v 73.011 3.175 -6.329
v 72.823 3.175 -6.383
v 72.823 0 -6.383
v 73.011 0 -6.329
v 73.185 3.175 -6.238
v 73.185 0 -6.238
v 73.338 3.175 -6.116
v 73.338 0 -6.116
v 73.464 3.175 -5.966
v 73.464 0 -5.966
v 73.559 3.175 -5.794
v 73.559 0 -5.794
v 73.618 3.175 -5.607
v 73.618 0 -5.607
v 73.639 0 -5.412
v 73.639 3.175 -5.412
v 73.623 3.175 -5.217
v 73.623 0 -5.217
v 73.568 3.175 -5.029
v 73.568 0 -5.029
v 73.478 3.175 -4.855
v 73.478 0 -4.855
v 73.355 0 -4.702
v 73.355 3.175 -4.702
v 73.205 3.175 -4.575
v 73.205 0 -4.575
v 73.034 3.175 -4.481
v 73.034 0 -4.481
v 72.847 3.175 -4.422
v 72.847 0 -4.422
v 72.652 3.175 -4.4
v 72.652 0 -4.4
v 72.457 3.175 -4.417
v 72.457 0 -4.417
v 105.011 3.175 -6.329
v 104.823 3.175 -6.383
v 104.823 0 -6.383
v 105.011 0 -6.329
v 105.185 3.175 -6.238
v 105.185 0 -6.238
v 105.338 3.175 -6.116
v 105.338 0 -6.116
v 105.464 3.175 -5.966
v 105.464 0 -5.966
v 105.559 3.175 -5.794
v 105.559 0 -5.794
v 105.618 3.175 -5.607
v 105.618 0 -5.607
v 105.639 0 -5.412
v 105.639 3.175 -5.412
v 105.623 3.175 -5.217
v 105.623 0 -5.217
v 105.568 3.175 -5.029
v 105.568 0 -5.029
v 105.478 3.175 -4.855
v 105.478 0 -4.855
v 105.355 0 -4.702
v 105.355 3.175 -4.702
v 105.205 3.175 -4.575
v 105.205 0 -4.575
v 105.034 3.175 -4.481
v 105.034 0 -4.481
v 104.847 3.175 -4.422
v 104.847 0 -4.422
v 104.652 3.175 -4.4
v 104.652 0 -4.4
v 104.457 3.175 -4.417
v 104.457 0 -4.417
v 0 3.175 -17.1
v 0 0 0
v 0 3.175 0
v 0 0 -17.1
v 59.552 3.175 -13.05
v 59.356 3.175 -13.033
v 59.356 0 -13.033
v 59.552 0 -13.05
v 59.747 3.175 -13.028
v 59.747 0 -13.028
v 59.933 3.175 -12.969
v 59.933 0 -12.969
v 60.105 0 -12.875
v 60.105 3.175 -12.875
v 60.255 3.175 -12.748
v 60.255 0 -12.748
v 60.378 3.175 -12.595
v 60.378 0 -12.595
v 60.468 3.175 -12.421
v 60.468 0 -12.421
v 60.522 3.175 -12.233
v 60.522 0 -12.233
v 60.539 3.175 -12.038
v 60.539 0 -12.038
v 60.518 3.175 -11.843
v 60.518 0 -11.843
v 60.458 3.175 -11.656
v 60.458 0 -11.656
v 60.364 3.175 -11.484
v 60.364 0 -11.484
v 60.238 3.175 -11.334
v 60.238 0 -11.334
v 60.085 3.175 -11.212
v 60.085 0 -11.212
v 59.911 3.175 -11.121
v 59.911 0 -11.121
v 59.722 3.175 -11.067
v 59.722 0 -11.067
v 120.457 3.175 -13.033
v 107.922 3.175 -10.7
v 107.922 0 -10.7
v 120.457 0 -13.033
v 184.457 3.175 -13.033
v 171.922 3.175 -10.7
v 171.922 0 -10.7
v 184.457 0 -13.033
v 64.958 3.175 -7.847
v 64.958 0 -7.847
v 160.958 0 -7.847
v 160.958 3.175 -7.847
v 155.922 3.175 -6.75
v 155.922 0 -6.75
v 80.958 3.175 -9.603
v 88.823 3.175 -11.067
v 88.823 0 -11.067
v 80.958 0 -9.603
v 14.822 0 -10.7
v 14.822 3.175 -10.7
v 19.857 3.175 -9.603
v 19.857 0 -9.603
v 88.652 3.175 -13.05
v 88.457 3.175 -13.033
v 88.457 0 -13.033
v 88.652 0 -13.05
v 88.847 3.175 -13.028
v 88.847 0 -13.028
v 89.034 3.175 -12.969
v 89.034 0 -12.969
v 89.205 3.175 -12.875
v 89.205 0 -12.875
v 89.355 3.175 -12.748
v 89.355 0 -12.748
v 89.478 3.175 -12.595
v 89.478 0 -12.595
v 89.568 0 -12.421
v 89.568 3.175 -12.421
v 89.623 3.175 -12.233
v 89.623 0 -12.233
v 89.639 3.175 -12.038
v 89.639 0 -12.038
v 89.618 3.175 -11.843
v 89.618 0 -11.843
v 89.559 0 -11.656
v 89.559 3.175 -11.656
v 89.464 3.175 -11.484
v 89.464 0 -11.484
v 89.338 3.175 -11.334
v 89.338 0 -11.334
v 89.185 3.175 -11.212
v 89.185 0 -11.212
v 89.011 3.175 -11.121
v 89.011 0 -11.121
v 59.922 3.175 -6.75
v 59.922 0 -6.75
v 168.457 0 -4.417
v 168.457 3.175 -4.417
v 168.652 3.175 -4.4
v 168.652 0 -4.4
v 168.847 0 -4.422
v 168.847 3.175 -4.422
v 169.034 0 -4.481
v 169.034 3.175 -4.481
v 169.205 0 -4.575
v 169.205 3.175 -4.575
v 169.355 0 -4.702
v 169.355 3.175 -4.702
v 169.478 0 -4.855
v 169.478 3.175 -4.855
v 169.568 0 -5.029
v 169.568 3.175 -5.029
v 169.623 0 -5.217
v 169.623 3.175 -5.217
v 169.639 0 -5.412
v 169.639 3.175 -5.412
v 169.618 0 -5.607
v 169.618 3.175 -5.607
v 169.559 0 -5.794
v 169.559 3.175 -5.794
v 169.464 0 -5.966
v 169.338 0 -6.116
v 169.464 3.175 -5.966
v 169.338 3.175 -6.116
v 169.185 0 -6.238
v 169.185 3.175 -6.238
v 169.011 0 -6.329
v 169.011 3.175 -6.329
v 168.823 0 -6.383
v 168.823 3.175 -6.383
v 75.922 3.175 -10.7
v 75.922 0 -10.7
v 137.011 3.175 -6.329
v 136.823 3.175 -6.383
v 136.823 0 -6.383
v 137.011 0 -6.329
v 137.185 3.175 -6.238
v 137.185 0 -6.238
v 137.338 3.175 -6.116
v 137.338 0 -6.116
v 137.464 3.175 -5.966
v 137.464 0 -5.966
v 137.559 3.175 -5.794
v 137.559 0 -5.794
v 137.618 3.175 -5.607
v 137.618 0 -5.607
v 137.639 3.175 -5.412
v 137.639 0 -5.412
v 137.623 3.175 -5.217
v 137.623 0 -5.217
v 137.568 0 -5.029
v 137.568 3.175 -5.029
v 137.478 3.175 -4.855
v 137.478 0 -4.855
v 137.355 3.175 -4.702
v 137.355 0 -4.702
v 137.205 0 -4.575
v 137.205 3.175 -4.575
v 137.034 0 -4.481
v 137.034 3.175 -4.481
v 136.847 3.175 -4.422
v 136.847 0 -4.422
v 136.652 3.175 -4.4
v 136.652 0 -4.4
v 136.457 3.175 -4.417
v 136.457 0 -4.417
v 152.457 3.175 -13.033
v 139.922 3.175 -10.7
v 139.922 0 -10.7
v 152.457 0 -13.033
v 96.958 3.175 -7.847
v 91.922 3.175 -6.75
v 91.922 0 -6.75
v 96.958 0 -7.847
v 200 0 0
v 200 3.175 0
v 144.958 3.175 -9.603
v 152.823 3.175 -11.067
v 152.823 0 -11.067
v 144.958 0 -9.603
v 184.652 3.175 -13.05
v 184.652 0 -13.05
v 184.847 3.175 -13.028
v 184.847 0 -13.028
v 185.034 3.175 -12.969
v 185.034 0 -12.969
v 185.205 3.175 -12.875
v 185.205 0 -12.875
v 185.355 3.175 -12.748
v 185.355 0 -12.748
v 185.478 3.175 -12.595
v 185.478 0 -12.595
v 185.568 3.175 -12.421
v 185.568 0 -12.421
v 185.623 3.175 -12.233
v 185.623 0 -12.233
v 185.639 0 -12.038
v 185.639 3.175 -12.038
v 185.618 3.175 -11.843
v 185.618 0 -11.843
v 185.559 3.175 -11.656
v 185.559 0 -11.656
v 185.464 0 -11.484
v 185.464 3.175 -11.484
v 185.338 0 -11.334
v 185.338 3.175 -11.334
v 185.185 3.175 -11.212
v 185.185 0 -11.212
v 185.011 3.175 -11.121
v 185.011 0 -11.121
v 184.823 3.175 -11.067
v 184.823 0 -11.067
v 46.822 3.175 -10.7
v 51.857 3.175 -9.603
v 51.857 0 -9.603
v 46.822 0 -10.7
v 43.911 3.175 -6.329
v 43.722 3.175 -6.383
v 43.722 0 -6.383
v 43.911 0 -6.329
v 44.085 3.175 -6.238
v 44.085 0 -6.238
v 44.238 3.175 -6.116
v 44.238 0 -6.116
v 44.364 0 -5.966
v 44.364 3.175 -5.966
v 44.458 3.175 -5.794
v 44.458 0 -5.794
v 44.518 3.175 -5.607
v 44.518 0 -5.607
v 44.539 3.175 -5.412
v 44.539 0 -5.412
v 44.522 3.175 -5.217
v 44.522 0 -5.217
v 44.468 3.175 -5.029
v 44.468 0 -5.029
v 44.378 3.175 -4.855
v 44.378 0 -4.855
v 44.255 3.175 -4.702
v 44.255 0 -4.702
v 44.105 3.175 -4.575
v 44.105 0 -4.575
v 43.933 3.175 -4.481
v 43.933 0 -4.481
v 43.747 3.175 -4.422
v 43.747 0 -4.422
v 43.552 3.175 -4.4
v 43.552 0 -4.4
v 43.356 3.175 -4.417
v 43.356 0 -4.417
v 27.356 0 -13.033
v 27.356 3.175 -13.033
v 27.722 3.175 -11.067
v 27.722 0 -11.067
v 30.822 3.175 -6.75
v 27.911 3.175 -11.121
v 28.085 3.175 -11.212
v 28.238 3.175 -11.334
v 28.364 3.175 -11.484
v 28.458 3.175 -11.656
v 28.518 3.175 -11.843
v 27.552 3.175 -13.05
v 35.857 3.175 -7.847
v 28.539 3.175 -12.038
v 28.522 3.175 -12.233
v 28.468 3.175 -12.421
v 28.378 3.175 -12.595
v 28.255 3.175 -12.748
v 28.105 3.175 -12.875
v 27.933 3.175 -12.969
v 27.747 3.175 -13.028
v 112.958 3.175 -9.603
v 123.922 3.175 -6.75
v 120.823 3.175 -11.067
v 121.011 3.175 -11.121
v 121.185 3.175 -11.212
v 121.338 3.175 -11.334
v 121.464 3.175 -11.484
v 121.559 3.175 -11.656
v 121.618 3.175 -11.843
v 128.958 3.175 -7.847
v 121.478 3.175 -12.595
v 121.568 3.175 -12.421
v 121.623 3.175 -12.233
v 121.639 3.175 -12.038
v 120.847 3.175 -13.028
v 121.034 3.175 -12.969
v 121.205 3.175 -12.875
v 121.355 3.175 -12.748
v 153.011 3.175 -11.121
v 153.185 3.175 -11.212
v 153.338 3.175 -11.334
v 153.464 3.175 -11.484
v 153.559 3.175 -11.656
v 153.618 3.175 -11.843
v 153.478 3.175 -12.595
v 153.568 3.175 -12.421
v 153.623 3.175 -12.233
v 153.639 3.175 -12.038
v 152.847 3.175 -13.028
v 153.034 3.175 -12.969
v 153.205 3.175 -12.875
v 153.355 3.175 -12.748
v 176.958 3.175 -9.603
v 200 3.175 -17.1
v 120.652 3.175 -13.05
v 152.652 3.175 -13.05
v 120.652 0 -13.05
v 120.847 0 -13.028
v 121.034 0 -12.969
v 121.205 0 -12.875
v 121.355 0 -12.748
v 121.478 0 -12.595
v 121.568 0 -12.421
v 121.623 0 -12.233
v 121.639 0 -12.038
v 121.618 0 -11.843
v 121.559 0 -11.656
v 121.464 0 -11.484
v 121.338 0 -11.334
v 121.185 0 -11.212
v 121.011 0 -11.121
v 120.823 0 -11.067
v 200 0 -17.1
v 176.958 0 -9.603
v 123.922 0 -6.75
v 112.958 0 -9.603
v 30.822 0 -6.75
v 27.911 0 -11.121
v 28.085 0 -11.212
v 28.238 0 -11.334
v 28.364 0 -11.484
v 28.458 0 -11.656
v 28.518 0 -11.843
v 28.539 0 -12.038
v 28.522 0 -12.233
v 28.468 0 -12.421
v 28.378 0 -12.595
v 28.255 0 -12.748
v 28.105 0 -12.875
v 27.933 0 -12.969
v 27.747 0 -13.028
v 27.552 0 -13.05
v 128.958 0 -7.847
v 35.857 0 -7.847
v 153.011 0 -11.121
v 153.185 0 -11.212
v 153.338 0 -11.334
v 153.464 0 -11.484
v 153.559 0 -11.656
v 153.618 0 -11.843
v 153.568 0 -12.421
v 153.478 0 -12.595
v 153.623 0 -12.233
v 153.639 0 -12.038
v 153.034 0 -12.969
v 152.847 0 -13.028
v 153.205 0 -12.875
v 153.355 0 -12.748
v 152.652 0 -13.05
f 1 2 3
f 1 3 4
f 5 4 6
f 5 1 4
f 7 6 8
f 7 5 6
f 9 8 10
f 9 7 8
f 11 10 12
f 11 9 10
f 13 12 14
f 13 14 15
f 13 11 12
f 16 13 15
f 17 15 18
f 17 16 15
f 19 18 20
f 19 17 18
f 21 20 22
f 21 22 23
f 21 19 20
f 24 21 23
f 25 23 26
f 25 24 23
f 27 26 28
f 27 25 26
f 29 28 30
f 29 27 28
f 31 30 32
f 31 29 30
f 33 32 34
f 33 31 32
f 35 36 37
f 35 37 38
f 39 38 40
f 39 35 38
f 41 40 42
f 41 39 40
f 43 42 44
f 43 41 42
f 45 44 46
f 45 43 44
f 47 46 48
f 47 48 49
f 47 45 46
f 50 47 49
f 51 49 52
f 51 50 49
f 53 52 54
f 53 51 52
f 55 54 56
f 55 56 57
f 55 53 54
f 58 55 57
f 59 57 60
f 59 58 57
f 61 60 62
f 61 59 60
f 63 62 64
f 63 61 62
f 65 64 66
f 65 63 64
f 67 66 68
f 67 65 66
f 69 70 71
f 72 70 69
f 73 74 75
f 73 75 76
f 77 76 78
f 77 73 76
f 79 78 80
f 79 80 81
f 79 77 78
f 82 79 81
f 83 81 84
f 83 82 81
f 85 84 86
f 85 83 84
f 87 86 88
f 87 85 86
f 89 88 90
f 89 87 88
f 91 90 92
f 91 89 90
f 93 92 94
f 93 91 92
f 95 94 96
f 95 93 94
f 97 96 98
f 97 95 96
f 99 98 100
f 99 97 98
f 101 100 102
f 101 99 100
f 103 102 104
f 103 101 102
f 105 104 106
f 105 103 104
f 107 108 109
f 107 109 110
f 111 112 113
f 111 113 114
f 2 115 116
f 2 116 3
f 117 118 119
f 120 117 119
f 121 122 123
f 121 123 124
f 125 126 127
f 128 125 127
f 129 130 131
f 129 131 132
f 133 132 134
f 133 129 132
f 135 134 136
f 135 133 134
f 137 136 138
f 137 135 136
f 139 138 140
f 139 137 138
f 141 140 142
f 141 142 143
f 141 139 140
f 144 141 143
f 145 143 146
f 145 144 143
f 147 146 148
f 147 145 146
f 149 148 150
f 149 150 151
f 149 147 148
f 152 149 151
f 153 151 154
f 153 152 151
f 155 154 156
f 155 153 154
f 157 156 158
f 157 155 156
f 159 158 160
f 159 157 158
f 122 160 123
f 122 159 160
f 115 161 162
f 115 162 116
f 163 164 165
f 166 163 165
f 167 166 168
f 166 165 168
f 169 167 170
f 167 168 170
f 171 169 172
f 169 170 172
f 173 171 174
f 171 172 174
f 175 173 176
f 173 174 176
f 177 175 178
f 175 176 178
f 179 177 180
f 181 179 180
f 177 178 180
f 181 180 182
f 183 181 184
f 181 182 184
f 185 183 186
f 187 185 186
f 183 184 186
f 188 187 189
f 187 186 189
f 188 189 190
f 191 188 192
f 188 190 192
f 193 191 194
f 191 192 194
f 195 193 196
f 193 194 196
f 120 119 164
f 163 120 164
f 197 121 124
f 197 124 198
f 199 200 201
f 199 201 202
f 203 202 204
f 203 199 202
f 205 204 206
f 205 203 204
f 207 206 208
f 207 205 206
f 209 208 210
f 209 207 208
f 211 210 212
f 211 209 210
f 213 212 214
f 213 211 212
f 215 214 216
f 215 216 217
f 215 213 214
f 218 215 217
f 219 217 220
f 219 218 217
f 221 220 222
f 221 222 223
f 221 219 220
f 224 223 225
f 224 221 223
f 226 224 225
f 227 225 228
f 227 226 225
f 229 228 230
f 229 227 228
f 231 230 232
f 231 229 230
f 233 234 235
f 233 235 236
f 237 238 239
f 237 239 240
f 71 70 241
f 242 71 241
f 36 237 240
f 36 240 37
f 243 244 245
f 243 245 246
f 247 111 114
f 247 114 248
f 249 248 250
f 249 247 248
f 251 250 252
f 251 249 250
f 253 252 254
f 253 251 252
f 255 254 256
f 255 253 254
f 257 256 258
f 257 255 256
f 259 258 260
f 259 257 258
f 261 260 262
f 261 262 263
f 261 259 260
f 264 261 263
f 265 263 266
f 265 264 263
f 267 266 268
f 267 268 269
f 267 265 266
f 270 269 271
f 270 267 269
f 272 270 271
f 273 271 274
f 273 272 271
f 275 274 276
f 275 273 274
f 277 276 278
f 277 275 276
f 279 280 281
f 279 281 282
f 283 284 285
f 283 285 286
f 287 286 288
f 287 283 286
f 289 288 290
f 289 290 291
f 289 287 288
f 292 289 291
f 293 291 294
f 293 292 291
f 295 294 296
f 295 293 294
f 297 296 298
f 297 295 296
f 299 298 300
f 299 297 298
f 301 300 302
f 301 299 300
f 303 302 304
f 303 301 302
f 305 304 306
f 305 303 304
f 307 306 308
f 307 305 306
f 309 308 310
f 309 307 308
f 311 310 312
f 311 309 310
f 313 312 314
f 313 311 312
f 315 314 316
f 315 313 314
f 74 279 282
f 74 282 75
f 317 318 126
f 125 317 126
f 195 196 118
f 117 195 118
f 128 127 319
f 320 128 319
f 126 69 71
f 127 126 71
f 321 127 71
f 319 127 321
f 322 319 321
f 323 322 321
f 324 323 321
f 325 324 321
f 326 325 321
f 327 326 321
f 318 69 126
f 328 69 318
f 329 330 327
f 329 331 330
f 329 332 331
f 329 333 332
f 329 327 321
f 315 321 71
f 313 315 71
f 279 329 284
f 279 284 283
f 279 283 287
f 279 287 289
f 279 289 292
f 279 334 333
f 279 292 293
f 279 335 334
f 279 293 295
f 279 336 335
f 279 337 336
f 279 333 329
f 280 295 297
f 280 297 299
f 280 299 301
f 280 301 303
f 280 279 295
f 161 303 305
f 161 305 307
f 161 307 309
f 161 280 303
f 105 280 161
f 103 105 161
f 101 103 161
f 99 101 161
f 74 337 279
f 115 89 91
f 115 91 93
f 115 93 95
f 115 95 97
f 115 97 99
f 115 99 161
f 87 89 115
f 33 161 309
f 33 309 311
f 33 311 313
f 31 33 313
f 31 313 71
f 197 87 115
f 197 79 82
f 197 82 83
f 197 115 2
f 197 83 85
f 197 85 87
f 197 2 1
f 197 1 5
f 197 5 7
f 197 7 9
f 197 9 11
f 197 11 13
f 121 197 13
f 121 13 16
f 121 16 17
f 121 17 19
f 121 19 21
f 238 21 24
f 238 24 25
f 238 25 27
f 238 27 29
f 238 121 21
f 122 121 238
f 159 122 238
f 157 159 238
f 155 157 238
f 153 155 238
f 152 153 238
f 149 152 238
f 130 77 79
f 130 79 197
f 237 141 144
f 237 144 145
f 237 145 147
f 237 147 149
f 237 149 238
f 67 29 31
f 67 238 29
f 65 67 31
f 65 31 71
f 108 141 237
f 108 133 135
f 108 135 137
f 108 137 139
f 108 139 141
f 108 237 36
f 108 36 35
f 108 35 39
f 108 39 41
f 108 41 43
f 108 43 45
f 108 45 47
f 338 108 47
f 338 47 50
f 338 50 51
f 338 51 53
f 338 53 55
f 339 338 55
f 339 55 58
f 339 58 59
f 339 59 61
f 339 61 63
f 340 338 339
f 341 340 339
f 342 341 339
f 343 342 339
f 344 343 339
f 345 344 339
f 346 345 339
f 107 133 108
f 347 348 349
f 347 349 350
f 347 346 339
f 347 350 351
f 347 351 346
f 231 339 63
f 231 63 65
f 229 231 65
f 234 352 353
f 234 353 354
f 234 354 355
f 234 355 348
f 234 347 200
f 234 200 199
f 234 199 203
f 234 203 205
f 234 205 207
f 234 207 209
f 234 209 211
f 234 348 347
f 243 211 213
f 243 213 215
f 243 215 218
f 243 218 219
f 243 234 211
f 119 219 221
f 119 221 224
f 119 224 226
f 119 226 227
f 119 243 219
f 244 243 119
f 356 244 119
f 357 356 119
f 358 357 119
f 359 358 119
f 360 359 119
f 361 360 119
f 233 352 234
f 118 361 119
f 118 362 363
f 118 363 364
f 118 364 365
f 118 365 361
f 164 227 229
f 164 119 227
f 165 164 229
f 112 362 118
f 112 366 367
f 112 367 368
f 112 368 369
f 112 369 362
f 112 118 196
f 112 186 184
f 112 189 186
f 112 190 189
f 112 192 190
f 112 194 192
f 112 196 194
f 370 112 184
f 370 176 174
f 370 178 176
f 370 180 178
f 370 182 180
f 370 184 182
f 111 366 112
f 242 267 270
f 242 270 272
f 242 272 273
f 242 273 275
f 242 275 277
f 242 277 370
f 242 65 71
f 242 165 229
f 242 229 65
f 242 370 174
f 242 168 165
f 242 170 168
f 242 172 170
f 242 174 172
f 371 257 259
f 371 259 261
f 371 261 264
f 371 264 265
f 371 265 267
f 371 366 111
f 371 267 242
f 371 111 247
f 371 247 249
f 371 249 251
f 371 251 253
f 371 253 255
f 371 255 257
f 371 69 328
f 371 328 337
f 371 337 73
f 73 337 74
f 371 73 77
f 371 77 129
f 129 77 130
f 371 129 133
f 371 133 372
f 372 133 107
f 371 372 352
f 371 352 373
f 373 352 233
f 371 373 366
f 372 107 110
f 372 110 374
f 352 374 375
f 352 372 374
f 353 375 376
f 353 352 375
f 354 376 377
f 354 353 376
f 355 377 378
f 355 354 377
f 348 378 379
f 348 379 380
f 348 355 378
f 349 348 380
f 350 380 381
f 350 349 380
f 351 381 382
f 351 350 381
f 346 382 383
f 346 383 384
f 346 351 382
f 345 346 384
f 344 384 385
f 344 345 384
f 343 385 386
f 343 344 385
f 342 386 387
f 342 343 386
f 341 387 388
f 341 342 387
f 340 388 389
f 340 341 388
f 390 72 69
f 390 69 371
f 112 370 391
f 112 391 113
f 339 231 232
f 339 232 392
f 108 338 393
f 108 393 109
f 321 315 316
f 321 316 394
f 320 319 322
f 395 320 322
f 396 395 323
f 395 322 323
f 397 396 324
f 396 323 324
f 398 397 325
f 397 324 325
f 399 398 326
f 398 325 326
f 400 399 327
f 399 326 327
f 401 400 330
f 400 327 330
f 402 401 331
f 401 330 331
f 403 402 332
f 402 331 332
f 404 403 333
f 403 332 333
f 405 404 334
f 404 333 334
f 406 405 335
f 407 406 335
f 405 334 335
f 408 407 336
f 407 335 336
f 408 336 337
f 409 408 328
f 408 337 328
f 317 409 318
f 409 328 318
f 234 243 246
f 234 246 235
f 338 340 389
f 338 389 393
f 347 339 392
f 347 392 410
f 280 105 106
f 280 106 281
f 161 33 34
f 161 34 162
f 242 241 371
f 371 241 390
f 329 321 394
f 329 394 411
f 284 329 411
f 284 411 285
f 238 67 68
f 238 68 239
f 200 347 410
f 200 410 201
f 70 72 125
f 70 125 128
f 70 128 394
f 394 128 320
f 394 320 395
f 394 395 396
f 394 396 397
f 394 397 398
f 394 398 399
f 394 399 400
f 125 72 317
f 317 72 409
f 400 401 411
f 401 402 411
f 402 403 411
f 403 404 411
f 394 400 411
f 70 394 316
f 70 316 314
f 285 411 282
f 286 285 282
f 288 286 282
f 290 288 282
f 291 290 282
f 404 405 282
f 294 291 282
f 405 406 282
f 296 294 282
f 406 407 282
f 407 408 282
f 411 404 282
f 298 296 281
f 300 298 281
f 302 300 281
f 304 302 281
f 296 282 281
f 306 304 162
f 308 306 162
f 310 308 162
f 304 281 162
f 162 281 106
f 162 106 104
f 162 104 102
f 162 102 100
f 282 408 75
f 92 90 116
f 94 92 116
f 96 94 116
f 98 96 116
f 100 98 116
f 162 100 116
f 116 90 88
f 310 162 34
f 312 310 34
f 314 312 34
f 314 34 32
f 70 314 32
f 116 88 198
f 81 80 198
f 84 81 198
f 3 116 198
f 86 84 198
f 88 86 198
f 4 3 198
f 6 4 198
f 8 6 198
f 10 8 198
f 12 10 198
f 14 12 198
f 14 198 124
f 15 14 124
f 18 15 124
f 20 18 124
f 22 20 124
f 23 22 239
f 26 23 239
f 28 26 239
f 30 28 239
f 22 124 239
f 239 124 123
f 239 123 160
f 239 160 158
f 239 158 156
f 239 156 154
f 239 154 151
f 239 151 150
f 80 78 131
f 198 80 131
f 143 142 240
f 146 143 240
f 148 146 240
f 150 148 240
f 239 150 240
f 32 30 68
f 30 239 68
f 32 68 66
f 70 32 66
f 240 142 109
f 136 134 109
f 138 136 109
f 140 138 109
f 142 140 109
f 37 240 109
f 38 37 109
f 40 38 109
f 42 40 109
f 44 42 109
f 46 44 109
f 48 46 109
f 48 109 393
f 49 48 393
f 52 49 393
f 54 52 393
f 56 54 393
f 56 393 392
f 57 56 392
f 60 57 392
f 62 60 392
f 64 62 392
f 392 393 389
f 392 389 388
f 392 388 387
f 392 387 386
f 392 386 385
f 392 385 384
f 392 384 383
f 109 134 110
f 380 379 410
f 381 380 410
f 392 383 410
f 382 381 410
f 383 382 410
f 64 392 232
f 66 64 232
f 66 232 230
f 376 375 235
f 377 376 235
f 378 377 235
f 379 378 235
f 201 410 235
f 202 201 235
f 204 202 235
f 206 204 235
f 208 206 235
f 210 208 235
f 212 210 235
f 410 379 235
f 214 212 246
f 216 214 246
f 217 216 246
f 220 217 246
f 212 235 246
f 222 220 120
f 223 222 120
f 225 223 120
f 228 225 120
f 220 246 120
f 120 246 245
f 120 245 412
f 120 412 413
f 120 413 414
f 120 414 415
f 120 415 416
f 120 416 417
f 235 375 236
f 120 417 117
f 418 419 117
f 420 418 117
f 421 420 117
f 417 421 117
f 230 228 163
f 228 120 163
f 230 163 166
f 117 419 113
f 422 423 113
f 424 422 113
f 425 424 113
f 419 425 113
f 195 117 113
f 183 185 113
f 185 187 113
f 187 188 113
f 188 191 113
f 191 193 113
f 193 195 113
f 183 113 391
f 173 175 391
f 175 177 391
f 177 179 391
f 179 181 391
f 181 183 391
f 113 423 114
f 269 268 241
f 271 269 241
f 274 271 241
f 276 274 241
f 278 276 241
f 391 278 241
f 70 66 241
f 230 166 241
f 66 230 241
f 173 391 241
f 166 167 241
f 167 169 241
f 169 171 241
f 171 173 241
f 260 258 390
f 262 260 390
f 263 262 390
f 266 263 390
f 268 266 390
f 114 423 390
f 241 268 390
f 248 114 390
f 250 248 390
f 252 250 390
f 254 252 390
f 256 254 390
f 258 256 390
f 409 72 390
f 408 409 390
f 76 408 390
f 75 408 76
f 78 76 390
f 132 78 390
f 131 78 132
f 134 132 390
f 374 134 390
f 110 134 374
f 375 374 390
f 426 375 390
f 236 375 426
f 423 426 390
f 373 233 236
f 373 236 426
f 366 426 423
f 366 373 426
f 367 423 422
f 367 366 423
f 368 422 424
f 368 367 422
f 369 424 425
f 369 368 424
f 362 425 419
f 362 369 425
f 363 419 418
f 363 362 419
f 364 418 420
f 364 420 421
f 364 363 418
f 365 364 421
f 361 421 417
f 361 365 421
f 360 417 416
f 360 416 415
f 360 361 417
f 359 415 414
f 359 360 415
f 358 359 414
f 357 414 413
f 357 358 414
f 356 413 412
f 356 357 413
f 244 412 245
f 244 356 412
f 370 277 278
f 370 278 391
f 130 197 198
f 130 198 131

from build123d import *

# Parameters (mm, degrees)
SKETCH4_W           = 200
SKETCH4_H           = 17.1
BOSS_EXTRUDE2_DEPTH = 3.175
CUT_EXTRUDE3_DEPTH  = 3.175


with BuildPart() as part:
    # Sketch4 → Boss-Extrude2 (new body)
    with BuildSketch(Plane(origin=(0, 0, 0), x_dir=(1, 0, 0), z_dir=(0, 1, 0))):
        with Locations((100, 8.55)):
            Rectangle(SKETCH4_W, SKETCH4_H)
    extrude(amount=BOSS_EXTRUDE2_DEPTH)

    # Sketch5 → Cut-Extrude3 (cut)
    with BuildSketch(Plane(origin=(0, 3.175, 0), x_dir=(1, 0, 0), z_dir=(0, 1, 0))):
        with BuildLine():
            ThreePointArc((59.356356651, 13.033114886), (60.52246094, 12.232989403), (59.722335457, 11.066885114))
            Line((59.722335457, 11.066885114), (51.857416371, 9.602969892))
            Line((51.857416371, 9.602969892), (46.821641859, 10.7))
            Line((46.821641859, 10.7), (59.356356651, 13.033114886))
        make_face()
        with BuildLine():
            ThreePointArc((72.822542019, 6.383114886), (73.622667502, 5.217010597), (72.456563214, 4.416885114))
            Line((72.456563214, 4.416885114), (59.921848421, 6.75))
            Line((59.921848421, 6.75), (64.957622934, 7.847030108))
            Line((64.957622934, 7.847030108), (72.822542019, 6.383114886))
        make_face()
        with BuildLine():
            ThreePointArc((88.456563214, 13.033114886), (89.622667502, 12.232989403), (88.822542019, 11.066885114))
            Line((88.822542019, 11.066885114), (80.957622934, 9.602969892))
            Line((80.957622934, 9.602969892), (75.921848421, 10.7))
            Line((75.921848421, 10.7), (88.456563214, 13.033114886))
        make_face()
        with BuildLine():
            ThreePointArc((104.822542019, 6.383114886), (105.622667502, 5.217010597), (104.456563214, 4.416885114))
            Line((104.456563214, 4.416885114), (91.921848421, 6.75))
            Line((91.921848421, 6.75), (96.957622934, 7.847030108))
            Line((96.957622934, 7.847030108), (104.822542019, 6.383114886))
        make_face()
        with BuildLine():
            ThreePointArc((120.456563214, 13.033114886), (121.622667502, 12.232989403), (120.822542019, 11.066885114))
            Line((120.822542019, 11.066885114), (112.957622934, 9.602969892))
            Line((112.957622934, 9.602969892), (107.921848421, 10.7))
            Line((107.921848421, 10.7), (120.456563214, 13.033114886))
        make_face()
        with BuildLine():
            ThreePointArc((152.456563214, 13.033114886), (153.622667502, 12.232989403), (152.822542019, 11.066885114))
            Line((152.822542019, 11.066885114), (144.957622934, 9.602969892))
            Line((144.957622934, 9.602969892), (139.921848421, 10.7))
            Line((139.921848421, 10.7), (152.456563214, 13.033114886))
        make_face()
        with BuildLine():
            ThreePointArc((184.456563214, 13.033114886), (185.622667502, 12.232989403), (184.822542019, 11.066885114))
            Line((184.822542019, 11.066885114), (176.957622934, 9.602969892))
            Line((176.957622934, 9.602969892), (171.921848421, 10.7))
            Line((171.921848421, 10.7), (184.456563214, 13.033114886))
        make_face()
        with BuildLine():
            Line((14.821641859, 10.7), (19.857416371, 9.602969892))
            Line((19.857416371, 9.602969892), (27.722335457, 11.066885114))
            ThreePointArc((27.722335457, 11.066885114), (28.52246094, 12.232989403), (27.356356651, 13.033114886))
            Line((27.356356651, 13.033114886), (14.821641859, 10.7))
        make_face()
        with BuildLine():
            Line((35.857416371, 7.847030108), (43.722335457, 6.383114886))
            ThreePointArc((43.722335457, 6.383114886), (44.52246094, 5.217010597), (43.356356651, 4.416885114))
            Line((43.356356651, 4.416885114), (30.821641859, 6.75))
            Line((30.821641859, 6.75), (35.857416371, 7.847030108))
        make_face()
        with BuildLine():
            Line((128.957622934, 7.847030108), (136.822542019, 6.383114886))
            ThreePointArc((136.822542019, 6.383114886), (137.622667502, 5.217010597), (136.456563214, 4.416885114))
            Line((136.456563214, 4.416885114), (123.921848421, 6.75))
            Line((123.921848421, 6.75), (128.957622934, 7.847030108))
        make_face()
        with BuildLine():
            Line((155.921848421, 6.75), (168.456563214, 4.416885114))
            ThreePointArc((168.456563214, 4.416885114), (169.622667502, 5.217010597), (168.822542019, 6.383114886))
            Line((168.822542019, 6.383114886), (160.957622934, 7.847030108))
            Line((160.957622934, 7.847030108), (155.921848421, 6.75))
        make_face()
    extrude(amount=-CUT_EXTRUDE3_DEPTH, mode=Mode.SUBTRACT)


solid = part.part
